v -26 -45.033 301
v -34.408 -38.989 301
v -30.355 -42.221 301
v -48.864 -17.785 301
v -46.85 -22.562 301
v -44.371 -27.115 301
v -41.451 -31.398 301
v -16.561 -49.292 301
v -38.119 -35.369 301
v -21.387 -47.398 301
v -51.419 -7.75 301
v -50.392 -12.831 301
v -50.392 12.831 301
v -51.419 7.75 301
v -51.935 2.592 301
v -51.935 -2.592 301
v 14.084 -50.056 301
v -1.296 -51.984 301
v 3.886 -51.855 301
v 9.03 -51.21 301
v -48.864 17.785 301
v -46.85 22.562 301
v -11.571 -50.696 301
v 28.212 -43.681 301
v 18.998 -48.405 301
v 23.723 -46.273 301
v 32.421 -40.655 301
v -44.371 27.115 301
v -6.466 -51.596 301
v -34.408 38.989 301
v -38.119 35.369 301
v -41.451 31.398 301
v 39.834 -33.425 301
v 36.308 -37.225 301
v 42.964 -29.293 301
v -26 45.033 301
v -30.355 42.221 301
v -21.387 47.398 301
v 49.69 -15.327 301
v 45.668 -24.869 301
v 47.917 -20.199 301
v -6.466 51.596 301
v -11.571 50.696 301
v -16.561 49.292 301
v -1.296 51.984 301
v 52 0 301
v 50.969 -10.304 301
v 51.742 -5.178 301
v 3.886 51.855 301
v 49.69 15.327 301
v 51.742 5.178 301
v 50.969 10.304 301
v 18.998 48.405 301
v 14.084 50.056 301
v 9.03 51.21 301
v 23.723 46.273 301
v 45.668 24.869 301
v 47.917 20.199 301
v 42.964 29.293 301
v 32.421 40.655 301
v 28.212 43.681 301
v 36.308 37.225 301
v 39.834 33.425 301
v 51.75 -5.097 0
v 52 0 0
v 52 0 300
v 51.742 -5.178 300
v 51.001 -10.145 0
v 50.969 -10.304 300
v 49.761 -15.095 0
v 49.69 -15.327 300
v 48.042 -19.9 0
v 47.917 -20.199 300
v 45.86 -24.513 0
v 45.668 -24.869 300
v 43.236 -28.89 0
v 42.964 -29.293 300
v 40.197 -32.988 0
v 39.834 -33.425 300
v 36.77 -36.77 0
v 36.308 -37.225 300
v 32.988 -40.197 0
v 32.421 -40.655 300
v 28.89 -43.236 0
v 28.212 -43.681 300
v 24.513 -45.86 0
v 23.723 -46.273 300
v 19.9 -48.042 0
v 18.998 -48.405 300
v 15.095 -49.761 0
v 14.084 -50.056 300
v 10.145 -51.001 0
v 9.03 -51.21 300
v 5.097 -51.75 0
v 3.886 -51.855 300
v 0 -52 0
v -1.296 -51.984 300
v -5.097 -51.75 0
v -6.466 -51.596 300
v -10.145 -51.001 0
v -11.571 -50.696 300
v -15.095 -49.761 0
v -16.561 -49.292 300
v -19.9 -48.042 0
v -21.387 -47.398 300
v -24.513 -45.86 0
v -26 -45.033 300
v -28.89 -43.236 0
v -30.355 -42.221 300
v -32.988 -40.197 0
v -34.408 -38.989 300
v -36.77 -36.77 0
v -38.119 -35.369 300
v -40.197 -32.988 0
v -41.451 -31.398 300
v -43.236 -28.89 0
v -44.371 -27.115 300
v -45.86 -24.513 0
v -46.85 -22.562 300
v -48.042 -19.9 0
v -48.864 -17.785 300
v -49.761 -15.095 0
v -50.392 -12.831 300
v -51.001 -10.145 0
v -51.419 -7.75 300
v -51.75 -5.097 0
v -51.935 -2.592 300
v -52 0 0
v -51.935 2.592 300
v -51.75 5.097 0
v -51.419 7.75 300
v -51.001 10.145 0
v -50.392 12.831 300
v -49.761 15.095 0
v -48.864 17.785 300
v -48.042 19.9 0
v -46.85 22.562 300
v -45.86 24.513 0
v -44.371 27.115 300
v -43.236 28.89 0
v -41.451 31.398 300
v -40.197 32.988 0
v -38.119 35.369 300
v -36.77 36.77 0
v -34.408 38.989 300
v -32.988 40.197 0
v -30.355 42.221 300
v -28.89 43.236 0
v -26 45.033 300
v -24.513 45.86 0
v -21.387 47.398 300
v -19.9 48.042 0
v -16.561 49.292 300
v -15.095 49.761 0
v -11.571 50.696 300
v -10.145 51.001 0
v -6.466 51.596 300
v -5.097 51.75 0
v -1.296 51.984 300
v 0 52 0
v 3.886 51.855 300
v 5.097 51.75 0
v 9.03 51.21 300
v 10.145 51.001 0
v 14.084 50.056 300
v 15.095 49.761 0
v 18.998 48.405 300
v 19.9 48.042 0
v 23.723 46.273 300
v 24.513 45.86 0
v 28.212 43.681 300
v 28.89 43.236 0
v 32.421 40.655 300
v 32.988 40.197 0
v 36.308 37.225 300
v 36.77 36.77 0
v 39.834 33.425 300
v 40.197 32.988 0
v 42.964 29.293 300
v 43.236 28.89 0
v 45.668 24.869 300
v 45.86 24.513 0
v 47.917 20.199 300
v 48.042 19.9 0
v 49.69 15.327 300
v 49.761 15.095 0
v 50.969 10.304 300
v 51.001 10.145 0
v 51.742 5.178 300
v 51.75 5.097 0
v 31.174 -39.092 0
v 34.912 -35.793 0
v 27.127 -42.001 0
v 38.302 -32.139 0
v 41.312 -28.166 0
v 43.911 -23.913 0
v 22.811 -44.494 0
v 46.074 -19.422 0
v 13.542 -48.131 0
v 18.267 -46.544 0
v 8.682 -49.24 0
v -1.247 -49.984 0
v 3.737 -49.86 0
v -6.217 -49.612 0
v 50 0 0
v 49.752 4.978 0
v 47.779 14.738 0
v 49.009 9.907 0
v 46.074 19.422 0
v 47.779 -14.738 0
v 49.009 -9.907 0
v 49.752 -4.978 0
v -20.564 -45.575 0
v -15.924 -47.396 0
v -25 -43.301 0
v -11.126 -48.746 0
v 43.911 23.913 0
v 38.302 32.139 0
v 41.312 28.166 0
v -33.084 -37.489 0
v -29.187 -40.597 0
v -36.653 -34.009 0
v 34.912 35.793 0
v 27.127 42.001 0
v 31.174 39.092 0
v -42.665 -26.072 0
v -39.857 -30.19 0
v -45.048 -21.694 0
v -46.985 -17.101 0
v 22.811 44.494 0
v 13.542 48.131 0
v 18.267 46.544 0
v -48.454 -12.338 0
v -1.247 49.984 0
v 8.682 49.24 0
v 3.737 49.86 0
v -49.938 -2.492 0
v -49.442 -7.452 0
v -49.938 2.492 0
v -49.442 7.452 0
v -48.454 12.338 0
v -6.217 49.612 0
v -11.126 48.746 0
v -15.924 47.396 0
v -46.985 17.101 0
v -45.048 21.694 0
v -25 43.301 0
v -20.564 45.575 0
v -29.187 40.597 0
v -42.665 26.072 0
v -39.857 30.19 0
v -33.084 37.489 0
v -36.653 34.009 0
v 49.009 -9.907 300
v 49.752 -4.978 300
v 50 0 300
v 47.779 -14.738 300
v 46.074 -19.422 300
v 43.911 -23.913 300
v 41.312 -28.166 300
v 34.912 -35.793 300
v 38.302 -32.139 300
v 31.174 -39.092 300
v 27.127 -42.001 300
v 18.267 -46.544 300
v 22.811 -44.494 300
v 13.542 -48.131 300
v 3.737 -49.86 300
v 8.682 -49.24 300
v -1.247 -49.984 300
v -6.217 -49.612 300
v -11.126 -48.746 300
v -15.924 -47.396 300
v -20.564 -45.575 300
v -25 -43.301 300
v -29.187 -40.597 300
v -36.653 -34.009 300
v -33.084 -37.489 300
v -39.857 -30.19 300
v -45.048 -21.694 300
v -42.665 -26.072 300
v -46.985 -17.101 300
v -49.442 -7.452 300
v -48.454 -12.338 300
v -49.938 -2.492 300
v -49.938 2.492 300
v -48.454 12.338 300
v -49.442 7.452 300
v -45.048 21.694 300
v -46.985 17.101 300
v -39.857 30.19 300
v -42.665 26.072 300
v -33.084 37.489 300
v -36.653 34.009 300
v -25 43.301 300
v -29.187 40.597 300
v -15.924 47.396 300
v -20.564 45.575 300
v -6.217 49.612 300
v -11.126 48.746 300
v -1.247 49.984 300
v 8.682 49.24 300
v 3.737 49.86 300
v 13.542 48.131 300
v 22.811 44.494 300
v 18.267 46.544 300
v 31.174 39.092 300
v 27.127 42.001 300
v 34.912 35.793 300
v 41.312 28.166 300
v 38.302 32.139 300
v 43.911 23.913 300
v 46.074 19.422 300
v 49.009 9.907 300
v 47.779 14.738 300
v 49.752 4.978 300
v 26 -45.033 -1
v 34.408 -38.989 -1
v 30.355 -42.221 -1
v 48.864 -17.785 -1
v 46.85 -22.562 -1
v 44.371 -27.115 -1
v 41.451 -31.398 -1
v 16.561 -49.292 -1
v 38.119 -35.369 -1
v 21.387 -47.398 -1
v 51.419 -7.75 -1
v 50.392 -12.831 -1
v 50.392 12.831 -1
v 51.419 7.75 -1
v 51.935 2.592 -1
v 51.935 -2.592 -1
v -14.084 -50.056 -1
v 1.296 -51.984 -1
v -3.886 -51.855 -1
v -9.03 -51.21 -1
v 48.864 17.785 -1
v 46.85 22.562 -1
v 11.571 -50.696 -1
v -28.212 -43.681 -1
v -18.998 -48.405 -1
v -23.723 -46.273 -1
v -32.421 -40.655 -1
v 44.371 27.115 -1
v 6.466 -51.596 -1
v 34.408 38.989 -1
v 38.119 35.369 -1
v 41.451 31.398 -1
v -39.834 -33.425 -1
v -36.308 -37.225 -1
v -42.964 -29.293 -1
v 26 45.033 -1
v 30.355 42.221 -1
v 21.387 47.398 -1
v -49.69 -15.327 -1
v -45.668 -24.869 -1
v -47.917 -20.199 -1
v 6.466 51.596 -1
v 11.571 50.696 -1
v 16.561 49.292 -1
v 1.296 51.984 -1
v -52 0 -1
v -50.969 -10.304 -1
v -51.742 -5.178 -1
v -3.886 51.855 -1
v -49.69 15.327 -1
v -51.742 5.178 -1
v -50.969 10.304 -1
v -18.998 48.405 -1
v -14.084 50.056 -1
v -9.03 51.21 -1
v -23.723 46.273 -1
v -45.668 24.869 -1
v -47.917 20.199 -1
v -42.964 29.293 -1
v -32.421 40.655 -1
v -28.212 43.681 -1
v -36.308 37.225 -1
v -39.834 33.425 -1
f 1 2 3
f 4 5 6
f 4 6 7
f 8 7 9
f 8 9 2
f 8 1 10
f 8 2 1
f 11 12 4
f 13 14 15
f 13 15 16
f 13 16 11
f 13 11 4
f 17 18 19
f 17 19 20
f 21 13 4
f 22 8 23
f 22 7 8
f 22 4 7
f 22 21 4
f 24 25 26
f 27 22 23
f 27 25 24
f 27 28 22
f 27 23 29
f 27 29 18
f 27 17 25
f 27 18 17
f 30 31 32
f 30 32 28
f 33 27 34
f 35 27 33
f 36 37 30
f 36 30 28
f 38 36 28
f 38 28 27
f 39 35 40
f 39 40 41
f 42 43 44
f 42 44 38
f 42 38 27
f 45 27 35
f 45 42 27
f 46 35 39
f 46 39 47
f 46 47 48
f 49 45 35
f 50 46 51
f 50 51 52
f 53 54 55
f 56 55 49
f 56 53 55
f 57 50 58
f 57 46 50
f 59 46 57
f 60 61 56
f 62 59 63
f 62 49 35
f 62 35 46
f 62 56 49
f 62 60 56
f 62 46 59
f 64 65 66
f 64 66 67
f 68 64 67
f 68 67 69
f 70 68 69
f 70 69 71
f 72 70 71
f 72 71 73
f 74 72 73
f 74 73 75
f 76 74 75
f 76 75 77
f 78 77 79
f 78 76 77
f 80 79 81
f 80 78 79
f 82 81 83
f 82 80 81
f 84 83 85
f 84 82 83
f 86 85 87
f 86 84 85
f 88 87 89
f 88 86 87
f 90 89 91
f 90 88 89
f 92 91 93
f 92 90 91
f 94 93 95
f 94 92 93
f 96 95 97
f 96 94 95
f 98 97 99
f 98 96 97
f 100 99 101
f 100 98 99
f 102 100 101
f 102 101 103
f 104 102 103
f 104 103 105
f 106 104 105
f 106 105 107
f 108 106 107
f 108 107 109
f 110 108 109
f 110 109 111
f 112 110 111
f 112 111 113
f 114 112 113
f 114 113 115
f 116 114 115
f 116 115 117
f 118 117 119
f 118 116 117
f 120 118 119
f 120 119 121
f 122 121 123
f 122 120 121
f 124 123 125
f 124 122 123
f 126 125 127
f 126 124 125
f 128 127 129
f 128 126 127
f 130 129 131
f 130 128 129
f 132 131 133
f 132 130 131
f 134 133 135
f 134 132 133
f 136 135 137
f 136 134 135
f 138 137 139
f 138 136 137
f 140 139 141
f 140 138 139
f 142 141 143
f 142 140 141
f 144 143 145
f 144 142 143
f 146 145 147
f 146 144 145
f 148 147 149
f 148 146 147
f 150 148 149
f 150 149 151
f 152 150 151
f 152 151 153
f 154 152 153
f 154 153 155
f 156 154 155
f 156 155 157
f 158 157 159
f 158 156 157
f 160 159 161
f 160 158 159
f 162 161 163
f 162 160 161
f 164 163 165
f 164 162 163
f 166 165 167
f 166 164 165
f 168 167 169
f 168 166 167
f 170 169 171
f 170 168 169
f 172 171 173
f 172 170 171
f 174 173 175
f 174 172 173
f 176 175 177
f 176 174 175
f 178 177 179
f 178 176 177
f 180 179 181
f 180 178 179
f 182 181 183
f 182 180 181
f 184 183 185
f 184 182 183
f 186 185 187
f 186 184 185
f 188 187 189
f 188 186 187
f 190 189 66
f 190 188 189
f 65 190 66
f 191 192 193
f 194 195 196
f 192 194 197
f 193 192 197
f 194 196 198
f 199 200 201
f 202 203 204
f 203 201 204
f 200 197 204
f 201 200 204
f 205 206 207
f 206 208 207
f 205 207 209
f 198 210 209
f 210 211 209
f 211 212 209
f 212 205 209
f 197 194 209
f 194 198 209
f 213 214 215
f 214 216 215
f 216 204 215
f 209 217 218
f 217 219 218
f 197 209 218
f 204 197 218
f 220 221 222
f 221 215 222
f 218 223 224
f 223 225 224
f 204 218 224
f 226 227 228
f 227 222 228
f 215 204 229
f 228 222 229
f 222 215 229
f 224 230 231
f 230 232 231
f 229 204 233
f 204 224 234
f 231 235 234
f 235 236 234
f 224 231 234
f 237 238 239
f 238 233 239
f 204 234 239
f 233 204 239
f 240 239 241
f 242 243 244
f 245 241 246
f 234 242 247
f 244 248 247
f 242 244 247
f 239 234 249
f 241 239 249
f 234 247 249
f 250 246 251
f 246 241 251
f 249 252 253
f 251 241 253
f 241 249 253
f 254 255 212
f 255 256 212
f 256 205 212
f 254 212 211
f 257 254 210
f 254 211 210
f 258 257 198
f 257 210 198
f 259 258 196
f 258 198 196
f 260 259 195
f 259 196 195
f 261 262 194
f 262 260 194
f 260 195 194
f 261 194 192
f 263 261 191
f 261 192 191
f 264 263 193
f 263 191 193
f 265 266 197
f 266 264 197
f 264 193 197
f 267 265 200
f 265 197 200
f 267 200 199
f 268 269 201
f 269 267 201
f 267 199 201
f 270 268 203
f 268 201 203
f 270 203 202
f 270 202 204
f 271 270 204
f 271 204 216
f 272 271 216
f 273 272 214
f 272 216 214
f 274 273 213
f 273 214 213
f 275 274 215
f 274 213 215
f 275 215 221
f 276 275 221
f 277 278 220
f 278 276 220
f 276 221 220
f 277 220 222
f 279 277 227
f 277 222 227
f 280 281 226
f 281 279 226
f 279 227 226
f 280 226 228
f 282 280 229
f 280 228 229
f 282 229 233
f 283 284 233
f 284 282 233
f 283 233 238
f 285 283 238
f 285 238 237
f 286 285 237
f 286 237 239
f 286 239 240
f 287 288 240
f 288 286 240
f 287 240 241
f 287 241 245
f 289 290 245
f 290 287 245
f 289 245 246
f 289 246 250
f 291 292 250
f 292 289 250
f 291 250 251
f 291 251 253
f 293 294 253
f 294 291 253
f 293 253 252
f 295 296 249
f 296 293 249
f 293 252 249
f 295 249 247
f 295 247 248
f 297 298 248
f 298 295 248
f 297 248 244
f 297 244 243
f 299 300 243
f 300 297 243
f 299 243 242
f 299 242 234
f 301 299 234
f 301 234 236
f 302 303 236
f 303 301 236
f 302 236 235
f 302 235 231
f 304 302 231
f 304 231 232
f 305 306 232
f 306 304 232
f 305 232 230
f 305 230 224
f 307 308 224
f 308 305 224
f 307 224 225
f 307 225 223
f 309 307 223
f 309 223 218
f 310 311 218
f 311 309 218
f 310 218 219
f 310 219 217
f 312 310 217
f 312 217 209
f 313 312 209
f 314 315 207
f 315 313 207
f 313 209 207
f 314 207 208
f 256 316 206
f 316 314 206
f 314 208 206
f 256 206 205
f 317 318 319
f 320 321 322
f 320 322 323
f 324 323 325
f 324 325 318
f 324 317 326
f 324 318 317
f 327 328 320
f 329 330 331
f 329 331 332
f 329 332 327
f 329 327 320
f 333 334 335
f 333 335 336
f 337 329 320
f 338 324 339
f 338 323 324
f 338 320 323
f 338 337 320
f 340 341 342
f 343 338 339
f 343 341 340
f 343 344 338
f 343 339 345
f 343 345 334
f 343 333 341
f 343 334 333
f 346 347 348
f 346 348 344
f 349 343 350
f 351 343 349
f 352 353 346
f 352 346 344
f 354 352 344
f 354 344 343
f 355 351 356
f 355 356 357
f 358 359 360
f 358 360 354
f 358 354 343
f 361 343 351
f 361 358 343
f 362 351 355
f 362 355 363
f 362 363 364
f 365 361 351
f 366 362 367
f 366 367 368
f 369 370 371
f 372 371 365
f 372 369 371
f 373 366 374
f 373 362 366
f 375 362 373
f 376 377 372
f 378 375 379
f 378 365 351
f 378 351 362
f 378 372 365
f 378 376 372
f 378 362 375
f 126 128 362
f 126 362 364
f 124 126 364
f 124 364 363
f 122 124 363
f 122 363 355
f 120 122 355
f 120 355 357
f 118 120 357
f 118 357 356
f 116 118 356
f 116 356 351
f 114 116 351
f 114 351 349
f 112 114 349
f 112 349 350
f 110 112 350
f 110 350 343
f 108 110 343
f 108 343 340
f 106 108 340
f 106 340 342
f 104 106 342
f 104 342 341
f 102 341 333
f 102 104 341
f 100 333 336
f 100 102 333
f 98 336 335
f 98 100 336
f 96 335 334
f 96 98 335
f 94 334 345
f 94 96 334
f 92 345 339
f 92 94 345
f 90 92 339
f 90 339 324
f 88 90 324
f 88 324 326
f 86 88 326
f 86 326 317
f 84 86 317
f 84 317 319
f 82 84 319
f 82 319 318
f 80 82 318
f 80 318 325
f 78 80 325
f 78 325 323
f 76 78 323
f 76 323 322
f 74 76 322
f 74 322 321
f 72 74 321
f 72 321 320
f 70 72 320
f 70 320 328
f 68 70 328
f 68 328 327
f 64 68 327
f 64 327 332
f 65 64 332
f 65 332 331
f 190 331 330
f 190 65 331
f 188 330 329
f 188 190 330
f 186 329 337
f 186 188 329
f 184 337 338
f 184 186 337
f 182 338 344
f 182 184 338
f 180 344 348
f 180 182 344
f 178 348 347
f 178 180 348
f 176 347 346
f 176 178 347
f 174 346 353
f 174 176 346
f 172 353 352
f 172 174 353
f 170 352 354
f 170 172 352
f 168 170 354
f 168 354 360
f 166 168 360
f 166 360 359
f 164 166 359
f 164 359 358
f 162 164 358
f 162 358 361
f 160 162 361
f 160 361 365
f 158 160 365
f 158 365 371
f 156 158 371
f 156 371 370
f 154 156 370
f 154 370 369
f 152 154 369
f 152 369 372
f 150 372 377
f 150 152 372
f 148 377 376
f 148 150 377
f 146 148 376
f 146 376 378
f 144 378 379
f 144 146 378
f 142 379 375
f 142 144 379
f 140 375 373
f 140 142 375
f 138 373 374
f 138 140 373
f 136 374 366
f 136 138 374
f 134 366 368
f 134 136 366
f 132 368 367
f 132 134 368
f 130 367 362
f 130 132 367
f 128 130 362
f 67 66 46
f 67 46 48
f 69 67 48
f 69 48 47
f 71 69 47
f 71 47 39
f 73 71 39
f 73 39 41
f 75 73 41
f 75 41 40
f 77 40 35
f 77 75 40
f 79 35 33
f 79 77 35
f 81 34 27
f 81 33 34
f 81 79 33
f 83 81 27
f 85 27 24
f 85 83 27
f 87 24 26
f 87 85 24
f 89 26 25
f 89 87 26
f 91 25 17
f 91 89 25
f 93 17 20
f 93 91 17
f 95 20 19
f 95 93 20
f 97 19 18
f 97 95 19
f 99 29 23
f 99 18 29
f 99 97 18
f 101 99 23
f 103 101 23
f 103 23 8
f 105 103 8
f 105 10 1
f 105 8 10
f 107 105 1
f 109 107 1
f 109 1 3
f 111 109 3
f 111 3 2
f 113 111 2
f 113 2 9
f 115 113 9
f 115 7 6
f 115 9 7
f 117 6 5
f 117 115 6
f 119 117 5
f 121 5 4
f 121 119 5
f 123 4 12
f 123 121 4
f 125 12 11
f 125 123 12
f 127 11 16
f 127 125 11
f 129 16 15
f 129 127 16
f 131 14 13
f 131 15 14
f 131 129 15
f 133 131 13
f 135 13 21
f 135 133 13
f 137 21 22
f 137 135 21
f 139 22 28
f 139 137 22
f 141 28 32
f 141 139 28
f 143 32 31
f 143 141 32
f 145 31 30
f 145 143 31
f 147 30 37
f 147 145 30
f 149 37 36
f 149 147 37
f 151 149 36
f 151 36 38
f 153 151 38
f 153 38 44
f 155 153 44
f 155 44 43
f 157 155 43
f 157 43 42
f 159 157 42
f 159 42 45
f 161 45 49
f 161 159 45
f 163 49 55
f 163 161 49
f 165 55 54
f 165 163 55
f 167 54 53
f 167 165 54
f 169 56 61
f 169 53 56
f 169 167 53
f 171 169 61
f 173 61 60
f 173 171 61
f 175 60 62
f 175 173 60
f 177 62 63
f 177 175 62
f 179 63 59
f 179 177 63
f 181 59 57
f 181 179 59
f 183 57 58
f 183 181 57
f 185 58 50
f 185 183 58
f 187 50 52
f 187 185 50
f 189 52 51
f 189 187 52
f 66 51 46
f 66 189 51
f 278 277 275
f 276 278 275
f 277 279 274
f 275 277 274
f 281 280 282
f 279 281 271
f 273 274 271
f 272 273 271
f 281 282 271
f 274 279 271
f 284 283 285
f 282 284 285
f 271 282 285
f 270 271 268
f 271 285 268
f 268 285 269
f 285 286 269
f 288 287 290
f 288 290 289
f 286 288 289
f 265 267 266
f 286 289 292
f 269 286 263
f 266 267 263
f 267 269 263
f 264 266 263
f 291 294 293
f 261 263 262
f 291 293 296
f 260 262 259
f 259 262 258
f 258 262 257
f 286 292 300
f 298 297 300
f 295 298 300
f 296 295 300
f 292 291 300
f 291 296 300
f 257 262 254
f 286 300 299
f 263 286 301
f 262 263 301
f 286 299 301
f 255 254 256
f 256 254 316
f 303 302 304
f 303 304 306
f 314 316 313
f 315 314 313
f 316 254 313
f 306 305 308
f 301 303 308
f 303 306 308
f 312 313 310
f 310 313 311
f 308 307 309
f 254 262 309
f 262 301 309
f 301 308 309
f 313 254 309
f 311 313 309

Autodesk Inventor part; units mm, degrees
ref_plane "YZ Plane" through (0, 0, 0) normal (1, 0, 0) x (0, 1, 0)
ref_plane "XZ Plane" through (0, 0, 0) normal (0, 1, 0) x (-1, 0, 0)
ref_plane "XY Plane" through (0, 0, 0) normal (0, 0, 1) x (1, 0, 0)
sketch "Sketch1" plane through (0, 0, 0) normal (0, 0, 1) x (1, 0, 0)
  circle A0 centre (0, 0) radius 50
  circle A1 centre (0, 0) radius 52
  dimension "d0" = 100
  dimension "d1" = 2
extrude "Extrusion1" add sketch "Sketch1" along normal blind 300
sketch "Sketch2" plane through (0, 0, 0) normal (0, 0, -1) x (-1, 0, 0)
  circle A0 centre (0, 0) radius 52
extrude "Extrusion2" add sketch "Sketch2" along normal blind 1
sketch "Sketch3" plane through (0, 0, 300) normal (0, 0, 1) x (1, 0, 0)
  circle A0 centre (0, 0) radius 52
extrude "Extrusion3" add sketch "Sketch3" along normal blind 1
properties part number "Chamber"
